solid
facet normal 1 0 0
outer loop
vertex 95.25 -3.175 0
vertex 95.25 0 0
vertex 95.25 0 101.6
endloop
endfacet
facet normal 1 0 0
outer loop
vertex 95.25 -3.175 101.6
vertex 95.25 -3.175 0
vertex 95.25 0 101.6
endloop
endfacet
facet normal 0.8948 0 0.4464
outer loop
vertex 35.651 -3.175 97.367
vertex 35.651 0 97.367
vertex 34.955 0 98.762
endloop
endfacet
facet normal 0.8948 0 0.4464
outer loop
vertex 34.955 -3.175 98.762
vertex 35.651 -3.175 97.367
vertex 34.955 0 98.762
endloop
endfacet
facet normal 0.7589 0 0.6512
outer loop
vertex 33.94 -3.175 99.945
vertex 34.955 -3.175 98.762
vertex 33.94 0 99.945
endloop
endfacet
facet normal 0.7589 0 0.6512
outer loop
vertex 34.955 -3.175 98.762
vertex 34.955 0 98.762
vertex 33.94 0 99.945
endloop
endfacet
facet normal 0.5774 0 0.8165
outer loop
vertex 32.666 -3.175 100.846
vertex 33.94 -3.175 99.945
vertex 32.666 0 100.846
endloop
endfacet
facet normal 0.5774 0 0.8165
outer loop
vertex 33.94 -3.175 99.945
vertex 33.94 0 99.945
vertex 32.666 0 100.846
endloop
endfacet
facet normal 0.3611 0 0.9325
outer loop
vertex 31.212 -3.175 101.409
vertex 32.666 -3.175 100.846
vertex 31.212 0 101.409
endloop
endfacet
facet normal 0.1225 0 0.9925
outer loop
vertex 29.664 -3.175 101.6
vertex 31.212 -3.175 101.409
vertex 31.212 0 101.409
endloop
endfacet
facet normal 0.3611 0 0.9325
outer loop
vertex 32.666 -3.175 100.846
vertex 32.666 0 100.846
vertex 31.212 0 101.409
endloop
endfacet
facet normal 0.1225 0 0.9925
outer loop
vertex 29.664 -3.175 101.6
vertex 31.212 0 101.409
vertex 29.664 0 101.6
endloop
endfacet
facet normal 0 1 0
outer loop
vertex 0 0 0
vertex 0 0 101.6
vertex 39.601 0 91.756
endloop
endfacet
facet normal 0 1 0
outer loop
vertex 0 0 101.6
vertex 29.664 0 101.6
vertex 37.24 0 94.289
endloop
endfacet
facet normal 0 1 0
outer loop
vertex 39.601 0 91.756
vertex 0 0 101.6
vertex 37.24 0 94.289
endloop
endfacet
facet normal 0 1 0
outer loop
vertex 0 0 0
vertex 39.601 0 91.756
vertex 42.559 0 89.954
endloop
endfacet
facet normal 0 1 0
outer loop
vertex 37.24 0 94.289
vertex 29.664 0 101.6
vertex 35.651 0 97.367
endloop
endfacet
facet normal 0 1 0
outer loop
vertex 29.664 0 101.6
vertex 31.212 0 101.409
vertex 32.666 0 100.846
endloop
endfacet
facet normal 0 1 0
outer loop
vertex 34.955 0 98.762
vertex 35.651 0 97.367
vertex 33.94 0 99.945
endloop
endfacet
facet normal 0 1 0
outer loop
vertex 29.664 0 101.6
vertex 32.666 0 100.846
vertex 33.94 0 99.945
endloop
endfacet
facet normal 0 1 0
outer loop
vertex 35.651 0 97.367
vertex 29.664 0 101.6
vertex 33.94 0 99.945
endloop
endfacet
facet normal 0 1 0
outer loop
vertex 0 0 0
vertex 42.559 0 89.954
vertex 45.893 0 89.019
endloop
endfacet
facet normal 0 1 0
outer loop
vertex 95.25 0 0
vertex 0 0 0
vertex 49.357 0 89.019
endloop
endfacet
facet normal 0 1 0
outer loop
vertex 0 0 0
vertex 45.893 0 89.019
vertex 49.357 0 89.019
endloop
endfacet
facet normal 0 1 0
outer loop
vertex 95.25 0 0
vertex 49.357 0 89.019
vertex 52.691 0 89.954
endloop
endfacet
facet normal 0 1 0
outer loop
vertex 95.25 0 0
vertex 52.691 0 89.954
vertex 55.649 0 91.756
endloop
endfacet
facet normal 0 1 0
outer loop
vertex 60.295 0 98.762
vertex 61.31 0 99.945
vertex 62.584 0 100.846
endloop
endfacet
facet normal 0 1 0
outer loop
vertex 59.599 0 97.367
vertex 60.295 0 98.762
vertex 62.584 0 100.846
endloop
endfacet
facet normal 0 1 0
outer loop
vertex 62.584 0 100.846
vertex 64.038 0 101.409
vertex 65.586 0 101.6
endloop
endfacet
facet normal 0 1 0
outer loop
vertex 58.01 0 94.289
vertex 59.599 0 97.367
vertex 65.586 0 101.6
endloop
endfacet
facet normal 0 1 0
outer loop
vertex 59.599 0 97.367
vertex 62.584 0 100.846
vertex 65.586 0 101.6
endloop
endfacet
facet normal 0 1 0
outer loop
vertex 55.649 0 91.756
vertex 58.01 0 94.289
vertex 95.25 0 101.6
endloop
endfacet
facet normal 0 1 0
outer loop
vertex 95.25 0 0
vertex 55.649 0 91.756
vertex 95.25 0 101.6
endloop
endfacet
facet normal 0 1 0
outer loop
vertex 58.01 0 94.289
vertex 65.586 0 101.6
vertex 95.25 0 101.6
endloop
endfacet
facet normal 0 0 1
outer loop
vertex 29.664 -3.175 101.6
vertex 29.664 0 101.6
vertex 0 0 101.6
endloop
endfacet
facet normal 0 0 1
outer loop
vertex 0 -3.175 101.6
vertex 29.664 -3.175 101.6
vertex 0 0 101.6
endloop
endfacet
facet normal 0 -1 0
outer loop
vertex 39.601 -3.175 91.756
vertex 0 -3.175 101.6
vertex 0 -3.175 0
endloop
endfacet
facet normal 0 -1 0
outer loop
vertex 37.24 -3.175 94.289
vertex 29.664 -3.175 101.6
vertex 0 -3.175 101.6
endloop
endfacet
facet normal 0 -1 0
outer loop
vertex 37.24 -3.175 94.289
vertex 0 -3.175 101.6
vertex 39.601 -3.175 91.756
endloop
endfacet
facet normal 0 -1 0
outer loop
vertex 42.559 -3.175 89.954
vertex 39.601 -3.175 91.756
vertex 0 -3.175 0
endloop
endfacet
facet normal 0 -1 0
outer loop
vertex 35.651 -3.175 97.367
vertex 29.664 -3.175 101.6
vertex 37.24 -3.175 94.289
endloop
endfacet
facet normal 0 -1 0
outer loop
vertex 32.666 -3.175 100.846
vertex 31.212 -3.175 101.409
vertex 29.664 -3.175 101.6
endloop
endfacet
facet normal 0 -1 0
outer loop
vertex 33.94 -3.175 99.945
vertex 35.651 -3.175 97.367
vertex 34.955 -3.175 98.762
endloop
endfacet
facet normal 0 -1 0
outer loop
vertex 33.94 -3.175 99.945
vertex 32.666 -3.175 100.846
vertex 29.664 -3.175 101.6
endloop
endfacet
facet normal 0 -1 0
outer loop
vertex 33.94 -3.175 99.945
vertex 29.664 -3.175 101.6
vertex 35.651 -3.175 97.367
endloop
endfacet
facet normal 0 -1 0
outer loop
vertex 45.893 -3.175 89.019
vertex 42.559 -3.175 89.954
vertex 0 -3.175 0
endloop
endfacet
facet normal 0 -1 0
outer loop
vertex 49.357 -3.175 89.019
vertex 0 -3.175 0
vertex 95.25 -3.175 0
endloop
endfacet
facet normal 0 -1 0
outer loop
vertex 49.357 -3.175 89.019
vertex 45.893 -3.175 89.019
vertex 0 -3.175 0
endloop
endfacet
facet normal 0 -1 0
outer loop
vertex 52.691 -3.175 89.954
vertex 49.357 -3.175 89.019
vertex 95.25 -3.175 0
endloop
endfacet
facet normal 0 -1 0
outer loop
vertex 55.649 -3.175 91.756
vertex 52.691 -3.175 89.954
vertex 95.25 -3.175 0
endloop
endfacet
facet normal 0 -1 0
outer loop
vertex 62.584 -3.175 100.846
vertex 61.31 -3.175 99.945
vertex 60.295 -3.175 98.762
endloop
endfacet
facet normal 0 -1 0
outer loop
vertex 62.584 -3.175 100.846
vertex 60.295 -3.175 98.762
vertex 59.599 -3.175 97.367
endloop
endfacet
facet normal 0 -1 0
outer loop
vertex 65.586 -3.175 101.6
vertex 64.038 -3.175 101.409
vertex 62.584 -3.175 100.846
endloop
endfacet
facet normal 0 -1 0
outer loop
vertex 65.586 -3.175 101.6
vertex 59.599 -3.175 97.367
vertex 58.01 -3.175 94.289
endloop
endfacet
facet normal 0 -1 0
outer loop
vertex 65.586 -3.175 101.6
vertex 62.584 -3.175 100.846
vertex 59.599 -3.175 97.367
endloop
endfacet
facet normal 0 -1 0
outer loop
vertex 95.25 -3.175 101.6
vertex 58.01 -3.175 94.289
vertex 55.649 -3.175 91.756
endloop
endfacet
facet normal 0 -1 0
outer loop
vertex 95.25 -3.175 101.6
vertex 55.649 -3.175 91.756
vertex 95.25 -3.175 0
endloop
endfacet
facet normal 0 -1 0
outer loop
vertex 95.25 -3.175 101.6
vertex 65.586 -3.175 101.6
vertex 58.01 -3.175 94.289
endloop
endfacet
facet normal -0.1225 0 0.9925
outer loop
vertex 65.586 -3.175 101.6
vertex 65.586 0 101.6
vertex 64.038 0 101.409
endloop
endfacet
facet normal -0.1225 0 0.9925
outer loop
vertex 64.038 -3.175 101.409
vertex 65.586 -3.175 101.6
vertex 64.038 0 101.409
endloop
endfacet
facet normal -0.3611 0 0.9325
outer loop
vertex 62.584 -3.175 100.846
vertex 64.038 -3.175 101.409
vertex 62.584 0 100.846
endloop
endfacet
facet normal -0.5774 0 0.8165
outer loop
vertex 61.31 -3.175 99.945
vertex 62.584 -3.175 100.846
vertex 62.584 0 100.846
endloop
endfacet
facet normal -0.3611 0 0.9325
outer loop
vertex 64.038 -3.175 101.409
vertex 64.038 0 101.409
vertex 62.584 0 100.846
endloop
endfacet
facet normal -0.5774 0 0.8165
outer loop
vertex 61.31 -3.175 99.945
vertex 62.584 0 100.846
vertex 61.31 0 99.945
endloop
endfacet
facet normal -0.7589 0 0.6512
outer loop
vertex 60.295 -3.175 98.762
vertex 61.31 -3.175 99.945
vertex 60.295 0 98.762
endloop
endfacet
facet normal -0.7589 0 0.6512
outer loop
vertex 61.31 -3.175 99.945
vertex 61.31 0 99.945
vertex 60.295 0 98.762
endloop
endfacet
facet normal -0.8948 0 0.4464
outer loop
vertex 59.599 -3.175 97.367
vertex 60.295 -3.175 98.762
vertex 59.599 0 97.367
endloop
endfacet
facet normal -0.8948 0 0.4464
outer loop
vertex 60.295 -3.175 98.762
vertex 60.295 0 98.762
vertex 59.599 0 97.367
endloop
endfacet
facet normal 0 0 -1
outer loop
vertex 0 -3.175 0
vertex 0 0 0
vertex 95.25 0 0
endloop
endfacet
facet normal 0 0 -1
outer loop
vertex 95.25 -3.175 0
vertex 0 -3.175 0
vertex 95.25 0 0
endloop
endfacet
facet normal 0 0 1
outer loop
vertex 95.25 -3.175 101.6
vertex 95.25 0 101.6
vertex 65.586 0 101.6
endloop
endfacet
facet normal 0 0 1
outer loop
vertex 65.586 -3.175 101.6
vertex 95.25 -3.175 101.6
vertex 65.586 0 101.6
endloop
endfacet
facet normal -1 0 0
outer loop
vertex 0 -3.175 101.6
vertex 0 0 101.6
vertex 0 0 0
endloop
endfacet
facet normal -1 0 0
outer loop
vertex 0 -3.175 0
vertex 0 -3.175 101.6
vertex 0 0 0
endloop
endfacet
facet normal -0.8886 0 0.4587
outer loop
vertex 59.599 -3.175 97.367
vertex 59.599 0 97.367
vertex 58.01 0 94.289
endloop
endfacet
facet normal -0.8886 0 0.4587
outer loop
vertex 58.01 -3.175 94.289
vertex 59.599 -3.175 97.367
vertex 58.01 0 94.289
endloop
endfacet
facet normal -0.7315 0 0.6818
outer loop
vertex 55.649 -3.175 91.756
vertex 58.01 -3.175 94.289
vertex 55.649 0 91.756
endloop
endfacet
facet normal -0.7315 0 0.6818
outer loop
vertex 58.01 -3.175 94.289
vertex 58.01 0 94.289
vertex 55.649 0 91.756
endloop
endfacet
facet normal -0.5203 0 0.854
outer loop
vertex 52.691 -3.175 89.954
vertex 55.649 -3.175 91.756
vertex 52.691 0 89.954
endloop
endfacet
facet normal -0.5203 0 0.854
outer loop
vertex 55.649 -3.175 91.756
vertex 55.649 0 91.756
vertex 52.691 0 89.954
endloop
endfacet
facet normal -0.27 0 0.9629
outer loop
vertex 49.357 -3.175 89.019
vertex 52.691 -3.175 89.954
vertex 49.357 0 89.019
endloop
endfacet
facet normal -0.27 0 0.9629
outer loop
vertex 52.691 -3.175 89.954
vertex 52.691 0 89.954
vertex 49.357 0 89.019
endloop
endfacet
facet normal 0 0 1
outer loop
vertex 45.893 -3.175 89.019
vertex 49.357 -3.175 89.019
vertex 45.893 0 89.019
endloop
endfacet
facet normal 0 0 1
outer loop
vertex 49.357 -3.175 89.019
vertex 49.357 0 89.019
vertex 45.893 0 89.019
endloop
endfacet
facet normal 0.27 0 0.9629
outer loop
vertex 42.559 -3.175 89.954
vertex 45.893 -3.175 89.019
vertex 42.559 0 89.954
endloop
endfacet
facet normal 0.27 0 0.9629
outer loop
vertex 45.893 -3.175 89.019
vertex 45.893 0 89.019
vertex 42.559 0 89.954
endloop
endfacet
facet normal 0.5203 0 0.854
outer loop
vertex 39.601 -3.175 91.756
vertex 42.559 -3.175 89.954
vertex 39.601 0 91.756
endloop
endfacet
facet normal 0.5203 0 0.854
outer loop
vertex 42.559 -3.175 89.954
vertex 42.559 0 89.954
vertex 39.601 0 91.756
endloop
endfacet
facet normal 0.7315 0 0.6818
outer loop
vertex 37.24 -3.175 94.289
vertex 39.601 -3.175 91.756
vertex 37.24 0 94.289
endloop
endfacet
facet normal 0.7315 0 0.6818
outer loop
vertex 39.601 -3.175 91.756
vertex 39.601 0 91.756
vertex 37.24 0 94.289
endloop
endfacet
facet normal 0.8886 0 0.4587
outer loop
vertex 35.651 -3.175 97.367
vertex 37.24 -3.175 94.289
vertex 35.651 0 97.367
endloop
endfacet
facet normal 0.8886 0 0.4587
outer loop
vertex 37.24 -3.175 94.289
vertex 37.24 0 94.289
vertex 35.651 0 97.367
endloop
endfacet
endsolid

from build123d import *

# Parameters (mm, degrees)
F1_DEPTH = 3.175


with BuildPart() as f1:
    # F0 (on Front) → F1 (new body)
    with BuildSketch(Plane.XZ):
        with BuildLine():
            Line((0, 101.6), (0, 0))
            Line((0, 0), (95.25, 0))
            Line((95.25, 0), (95.25, 101.6))
            Line((95.25, 101.6), (65.585512, 101.6))
            ThreePointArc((65.585512, 101.6), (61.919338, 100.434753), (59.598675, 97.366667))
            ThreePointArc((59.598675, 97.366667), (47.625, 88.9), (35.651325, 97.366667))
            ThreePointArc((35.651325, 97.366667), (33.330662, 100.434753), (29.664488, 101.6))
            Line((29.664488, 101.6), (0, 101.6))
        make_face()
    extrude(amount=F1_DEPTH)


solid = f1.part
